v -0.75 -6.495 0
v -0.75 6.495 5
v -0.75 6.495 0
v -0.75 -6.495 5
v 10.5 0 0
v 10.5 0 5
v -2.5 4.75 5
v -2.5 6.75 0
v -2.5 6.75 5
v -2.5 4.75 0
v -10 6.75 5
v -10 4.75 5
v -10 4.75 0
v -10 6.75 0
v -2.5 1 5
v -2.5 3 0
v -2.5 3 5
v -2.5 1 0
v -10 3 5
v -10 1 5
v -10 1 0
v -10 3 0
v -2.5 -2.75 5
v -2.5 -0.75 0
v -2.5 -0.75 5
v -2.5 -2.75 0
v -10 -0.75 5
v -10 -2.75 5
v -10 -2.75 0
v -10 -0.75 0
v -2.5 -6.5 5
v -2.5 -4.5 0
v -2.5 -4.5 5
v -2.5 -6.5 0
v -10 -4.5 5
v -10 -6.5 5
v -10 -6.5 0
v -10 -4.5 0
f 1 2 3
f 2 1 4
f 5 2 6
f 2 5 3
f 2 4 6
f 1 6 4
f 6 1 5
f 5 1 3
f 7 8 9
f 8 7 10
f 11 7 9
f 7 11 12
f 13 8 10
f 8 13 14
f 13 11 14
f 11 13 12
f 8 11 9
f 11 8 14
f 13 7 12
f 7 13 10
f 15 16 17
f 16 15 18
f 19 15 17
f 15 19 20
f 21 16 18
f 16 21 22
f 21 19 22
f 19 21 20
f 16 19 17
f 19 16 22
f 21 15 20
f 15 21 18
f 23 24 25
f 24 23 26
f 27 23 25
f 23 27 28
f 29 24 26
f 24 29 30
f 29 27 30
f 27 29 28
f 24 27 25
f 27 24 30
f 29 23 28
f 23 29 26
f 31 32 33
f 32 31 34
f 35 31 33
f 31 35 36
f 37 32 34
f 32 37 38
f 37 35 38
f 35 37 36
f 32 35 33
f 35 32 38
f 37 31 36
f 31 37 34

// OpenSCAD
// file: common.scad
module arrow() {
    union() {
        translate([-3,-1.5,0]) cube([4,3,0.5]);
        translate([2.5,0,0]) cylinder(0.5,3,3,$fn=3);
    }
}

module _wave_s() {
    difference() {
        translate([0,2.5,0]) cylinder(0.5,3,3);
        translate([0,2,-10]) cylinder(30,3,3);
    }
    translate([6,0,0]) difference() {
        translate([0,2,0]) cylinder(0.5,3,3);
        translate([0,2.5,-10]) cylinder(30,3,3);
    }
}

module wave() {
    $wave_scale = 0.75;
    scale([$wave_scale, $wave_scale, 1]) translate([0,-2,0]) {
        difference() {
            translate([9,0,0]) _wave_s();
            translate([15,-3,-1]) cube([6,10,2.5]);
        }
        translate([-3,0,0]) _wave_s();
        difference() {
            translate([-15,0,0]) _wave_s();
            translate([-21.5,-3,-1]) cube([6,10,2.5]);
        }
        
        mirror([-1,0,0]) {
            difference() {
                translate([9,0,0]) _wave_s();
                translate([15.75,-3,-1]) cube([6,10,2.5]);
            }
            translate([-3,0,0]) _wave_s();
            difference() {
                translate([-15,0,0]) _wave_s();
                translate([-20.75,-3,-1]) cube([6,10,2.5]);
            }
        }
    }
}
// main file
include <common.scad>;

$spacing = 3.75;
$offset = -6.5;
$line_l = 7.5;
$line_x = -10;

color([0,0.75,1]) {
    translate([3,0,0]) cylinder(5,7.5,7.5,false,$fn=3);
    translate([$line_x,($offset + ($spacing * 3)),0])
        cube([$line_l,2,5]);
    translate([$line_x,($offset + ($spacing * 2)),0])
        cube([$line_l,2,5]);
    translate([$line_x,($offset + ($spacing * 1)),0])
        cube([$line_l,2,5]);
    translate([$line_x,$offset,0]) cube([$line_l,2,5]);
}
